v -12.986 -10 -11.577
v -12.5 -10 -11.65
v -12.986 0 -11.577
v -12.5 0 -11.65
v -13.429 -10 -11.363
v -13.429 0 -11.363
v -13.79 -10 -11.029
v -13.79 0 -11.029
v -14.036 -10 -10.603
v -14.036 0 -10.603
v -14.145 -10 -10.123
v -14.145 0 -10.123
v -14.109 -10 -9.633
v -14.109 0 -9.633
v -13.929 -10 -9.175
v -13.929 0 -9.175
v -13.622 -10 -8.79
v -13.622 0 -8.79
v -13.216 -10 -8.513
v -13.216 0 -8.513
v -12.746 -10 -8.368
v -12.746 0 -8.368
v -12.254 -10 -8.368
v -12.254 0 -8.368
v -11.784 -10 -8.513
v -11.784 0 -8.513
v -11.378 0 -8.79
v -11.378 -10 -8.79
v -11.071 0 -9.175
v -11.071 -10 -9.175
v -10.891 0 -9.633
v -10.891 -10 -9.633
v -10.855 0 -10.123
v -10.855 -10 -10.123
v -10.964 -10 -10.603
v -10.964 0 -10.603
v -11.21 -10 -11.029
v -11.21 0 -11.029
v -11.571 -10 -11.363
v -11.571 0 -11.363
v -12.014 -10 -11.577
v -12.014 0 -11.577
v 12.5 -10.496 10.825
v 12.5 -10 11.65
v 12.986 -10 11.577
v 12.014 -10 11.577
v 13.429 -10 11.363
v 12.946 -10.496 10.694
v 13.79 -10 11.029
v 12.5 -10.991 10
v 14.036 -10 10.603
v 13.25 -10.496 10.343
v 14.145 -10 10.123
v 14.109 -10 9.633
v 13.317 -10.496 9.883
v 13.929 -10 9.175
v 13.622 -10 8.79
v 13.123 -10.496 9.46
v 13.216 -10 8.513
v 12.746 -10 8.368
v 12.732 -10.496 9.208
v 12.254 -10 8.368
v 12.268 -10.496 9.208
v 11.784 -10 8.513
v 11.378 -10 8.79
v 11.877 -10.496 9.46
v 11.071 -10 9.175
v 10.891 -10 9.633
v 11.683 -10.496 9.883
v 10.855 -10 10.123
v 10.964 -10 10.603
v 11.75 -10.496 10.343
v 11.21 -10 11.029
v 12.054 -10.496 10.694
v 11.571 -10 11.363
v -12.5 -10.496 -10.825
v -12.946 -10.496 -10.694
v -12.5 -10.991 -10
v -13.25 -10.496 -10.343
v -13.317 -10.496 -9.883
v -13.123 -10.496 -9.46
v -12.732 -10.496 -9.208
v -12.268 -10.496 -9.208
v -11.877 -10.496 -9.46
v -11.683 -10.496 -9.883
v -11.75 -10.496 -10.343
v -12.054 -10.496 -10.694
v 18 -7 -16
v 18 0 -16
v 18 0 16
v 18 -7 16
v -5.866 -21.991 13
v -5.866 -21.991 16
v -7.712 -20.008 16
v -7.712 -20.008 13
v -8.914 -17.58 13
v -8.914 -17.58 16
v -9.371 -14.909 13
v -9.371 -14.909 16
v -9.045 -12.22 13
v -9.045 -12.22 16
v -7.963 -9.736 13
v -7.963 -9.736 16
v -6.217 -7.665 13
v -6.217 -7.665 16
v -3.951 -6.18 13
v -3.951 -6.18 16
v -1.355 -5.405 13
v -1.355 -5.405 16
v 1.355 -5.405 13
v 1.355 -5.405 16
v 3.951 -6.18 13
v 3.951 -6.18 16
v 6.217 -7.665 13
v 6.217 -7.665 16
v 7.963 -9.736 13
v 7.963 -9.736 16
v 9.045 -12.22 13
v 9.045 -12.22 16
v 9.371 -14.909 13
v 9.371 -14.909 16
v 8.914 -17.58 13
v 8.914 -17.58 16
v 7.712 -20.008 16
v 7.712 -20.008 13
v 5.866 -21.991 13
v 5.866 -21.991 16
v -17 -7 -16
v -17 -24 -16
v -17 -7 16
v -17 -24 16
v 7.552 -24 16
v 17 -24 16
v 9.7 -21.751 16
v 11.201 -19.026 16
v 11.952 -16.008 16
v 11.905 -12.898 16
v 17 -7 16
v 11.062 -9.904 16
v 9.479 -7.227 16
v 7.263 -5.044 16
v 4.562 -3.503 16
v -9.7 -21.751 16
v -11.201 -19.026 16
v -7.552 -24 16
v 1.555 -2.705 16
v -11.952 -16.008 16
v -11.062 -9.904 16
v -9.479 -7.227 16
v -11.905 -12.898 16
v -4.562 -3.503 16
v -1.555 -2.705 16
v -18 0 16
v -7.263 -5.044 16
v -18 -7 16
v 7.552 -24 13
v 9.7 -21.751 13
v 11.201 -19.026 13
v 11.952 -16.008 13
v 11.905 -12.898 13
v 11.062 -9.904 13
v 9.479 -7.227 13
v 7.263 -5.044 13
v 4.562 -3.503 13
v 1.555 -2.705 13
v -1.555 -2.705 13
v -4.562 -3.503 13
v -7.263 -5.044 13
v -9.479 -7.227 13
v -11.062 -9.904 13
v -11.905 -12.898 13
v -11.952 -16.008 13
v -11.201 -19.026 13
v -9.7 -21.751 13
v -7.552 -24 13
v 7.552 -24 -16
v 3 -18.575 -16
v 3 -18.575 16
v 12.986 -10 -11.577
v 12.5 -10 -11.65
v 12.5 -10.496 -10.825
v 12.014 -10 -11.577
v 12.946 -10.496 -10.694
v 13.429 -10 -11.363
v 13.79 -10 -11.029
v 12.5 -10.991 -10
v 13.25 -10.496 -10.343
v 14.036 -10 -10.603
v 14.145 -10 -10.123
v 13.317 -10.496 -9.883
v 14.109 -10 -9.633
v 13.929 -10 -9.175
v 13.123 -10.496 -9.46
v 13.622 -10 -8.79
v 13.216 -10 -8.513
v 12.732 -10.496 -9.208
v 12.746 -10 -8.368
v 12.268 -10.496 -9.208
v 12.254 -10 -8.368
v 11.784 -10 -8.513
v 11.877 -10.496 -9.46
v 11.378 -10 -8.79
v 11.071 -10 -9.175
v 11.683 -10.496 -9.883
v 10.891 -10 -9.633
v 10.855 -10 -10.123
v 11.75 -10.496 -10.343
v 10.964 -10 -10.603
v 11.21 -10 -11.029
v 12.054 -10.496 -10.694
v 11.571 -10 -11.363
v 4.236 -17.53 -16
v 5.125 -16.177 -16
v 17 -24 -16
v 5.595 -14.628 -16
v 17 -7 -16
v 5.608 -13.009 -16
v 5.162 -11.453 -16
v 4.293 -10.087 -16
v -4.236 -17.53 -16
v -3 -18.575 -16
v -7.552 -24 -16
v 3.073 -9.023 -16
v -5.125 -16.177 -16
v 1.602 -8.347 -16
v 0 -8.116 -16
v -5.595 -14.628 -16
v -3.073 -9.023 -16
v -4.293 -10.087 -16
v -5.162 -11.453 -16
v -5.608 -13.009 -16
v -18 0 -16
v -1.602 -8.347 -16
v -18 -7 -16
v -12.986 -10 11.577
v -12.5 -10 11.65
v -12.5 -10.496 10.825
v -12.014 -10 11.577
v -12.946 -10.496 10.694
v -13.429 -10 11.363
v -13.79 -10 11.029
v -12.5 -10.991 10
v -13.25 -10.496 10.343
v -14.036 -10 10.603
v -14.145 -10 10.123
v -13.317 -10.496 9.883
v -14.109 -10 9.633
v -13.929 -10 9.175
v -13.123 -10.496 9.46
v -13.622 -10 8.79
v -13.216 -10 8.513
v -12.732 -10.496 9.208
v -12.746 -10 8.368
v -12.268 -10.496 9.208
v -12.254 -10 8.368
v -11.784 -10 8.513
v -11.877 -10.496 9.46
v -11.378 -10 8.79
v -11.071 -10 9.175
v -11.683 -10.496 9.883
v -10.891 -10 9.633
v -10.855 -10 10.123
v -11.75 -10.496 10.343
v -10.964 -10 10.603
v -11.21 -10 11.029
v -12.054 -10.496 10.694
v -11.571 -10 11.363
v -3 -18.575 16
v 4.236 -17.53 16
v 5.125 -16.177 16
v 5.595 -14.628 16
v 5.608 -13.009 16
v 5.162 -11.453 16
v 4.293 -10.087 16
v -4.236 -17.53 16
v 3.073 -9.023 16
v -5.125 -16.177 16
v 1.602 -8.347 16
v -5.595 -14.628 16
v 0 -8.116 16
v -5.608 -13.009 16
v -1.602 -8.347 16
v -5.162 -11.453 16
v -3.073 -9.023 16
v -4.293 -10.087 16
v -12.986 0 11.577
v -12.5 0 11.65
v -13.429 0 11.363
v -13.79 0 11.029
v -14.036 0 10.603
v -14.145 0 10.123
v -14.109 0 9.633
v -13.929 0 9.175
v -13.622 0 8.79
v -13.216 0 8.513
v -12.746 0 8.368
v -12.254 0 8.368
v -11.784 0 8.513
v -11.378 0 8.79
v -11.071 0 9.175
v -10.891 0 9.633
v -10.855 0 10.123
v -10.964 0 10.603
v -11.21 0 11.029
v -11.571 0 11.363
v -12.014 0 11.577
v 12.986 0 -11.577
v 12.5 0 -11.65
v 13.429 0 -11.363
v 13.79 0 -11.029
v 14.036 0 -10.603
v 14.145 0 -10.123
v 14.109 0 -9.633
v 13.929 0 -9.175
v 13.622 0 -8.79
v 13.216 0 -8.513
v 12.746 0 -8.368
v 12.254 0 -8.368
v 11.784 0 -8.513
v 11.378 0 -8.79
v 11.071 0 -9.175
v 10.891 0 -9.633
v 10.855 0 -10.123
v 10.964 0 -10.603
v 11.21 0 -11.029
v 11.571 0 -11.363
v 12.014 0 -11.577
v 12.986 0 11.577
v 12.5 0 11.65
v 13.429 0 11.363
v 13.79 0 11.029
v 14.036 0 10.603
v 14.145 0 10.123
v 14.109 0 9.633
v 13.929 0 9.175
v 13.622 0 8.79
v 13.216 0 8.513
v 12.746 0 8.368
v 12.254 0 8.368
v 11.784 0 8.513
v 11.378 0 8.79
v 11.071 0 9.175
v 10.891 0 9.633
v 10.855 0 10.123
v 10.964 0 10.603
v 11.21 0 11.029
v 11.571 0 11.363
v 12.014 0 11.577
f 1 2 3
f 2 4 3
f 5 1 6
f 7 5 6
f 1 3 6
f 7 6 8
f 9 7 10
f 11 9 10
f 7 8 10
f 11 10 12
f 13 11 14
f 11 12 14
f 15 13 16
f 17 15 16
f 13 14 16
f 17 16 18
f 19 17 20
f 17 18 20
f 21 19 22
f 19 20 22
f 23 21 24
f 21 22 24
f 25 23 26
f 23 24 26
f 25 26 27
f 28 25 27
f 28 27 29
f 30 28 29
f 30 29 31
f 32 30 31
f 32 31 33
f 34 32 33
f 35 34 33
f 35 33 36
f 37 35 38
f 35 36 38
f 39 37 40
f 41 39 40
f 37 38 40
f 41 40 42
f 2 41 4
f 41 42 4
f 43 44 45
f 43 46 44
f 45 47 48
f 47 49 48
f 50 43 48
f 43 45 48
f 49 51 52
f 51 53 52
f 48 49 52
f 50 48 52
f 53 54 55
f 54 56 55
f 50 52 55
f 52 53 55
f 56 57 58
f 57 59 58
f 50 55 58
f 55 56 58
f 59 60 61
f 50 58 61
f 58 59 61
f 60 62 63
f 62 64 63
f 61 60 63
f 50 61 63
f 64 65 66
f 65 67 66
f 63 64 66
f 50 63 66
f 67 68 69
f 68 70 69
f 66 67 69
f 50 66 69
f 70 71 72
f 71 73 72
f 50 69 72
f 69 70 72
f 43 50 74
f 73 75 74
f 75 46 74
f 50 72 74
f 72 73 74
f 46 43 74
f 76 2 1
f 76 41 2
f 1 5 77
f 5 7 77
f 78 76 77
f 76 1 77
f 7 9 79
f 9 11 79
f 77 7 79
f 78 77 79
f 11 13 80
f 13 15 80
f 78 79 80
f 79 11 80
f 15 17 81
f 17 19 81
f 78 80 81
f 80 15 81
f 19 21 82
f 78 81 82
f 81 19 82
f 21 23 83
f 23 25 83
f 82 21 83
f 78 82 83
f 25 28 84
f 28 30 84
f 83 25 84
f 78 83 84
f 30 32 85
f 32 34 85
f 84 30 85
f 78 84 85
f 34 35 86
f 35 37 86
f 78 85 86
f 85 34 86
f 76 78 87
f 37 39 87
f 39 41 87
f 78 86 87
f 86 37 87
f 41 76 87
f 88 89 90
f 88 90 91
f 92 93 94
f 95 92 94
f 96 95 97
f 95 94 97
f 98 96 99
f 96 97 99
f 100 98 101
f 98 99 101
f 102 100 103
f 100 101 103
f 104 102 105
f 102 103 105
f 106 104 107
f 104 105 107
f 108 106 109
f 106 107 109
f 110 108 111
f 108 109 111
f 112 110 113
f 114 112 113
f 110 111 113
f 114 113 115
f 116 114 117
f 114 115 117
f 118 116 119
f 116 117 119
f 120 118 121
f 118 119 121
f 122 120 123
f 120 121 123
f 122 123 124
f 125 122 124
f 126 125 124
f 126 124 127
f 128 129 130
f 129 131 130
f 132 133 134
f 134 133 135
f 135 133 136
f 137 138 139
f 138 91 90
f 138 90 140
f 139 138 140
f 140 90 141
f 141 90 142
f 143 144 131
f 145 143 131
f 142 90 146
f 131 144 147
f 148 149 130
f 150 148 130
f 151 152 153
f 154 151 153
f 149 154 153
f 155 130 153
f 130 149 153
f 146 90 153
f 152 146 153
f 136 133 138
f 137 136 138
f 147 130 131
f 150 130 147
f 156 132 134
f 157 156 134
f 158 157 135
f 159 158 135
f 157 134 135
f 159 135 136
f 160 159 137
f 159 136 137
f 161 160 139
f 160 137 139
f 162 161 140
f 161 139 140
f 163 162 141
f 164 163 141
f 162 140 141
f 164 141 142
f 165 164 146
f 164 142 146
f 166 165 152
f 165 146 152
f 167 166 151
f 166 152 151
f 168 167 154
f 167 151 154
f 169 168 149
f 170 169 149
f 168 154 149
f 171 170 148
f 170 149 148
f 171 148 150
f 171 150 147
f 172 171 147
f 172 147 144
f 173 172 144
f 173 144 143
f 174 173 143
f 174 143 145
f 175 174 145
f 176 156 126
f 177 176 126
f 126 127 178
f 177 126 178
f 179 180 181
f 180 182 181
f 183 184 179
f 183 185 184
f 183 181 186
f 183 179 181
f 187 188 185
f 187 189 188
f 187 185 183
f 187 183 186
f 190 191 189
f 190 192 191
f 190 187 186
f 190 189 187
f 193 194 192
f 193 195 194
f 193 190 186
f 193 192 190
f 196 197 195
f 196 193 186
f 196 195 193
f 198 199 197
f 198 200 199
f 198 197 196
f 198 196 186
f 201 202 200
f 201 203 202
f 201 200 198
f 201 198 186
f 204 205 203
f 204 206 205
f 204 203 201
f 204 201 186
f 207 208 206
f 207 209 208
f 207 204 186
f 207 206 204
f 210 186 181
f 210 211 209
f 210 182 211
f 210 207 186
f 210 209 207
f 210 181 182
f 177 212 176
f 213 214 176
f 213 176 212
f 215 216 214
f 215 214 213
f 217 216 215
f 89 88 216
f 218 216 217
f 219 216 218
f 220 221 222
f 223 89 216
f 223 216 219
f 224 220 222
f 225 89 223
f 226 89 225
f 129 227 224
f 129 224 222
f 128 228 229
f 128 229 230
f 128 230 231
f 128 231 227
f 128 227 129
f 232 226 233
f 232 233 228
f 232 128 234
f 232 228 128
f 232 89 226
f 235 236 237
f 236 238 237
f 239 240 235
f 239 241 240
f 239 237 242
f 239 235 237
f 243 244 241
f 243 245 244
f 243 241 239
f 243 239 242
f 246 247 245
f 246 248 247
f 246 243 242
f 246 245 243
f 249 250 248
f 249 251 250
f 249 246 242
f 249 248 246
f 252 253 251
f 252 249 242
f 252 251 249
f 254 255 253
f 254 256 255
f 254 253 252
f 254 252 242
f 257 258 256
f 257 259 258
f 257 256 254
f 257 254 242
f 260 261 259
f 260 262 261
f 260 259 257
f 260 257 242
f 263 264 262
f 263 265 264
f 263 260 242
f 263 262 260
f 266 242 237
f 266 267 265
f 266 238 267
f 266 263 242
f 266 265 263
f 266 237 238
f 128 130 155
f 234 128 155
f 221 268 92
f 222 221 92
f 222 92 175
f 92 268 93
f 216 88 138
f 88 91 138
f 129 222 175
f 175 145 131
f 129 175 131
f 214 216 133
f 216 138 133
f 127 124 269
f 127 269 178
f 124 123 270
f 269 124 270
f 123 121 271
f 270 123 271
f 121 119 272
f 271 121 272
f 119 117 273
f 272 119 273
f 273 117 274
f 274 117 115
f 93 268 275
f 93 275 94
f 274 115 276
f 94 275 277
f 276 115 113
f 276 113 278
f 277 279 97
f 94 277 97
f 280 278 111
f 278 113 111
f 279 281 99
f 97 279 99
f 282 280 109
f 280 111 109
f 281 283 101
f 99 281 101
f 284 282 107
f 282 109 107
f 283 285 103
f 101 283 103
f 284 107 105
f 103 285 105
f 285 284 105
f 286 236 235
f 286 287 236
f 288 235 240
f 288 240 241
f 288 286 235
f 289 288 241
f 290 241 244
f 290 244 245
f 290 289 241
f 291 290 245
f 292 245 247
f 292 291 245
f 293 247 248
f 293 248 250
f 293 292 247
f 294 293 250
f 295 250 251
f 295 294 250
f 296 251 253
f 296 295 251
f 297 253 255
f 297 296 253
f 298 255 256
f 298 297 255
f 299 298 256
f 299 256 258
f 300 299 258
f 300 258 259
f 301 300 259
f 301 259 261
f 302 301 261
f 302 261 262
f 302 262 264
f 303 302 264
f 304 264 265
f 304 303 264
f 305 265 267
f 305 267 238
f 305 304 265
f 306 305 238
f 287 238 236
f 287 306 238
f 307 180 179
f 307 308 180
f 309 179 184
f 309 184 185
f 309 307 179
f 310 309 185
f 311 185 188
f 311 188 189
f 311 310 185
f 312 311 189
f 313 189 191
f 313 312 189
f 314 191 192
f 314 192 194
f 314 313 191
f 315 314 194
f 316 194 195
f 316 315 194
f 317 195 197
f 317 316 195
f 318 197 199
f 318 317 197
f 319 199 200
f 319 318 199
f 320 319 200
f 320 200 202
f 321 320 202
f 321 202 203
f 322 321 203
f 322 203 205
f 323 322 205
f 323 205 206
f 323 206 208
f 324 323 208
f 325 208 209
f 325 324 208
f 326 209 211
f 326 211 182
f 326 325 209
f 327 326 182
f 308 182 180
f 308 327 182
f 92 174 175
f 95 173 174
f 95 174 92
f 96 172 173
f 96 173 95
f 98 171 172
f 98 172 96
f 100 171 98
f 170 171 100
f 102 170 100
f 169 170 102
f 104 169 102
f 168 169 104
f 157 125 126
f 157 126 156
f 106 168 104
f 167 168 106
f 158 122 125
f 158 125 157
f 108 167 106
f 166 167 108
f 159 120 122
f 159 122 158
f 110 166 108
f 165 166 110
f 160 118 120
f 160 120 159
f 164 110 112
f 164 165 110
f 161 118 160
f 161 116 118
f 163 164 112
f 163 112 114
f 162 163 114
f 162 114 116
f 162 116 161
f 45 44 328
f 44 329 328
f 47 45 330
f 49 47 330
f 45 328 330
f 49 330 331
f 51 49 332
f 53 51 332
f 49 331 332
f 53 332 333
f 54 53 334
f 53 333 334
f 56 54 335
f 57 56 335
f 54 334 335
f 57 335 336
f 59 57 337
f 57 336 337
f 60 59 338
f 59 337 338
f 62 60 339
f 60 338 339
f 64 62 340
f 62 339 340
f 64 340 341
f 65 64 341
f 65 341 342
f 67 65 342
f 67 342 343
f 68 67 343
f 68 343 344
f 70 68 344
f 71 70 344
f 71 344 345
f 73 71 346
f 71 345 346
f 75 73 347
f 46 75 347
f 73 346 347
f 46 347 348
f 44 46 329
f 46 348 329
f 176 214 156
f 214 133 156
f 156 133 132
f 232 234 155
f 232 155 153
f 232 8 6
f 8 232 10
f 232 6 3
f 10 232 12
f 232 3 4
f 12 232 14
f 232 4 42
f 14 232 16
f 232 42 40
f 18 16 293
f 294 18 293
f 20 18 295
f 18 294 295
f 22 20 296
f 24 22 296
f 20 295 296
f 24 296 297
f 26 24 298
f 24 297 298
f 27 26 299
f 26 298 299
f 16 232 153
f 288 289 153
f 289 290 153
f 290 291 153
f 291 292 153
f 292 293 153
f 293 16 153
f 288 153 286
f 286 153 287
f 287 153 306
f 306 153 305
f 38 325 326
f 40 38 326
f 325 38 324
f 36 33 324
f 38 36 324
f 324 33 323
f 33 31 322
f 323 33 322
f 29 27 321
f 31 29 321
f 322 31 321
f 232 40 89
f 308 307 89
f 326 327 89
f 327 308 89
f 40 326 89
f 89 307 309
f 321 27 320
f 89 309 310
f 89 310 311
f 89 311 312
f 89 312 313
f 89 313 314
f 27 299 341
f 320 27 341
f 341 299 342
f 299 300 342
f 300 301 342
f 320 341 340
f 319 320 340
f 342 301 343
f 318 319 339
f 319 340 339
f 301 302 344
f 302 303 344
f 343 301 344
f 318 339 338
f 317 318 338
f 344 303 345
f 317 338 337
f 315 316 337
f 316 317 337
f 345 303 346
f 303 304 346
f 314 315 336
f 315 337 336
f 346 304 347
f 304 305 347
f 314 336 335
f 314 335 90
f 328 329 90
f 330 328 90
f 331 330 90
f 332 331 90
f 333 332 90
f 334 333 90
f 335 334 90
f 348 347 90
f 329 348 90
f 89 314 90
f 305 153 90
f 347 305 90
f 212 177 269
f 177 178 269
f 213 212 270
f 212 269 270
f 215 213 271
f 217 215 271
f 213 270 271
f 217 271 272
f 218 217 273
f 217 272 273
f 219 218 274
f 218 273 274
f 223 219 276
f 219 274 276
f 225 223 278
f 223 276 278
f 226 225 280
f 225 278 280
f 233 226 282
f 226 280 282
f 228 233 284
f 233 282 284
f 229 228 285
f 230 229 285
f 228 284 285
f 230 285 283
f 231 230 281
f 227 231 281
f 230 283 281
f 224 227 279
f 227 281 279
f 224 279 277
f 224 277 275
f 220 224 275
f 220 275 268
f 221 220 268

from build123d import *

# Parameters (mm, degrees)
EXTRUDE_1_DEPTH     = 16
CUT_EXTRUDE_1_DEPTH = 3


with BuildPart() as part:
    # 草图1 → 凸台-拉伸1 (new, symmetric)
    with BuildSketch(Plane.XY):
        with BuildLine():
            Line((-18, 0), (18, 0))
            Line((18, 0), (18, -7))
            Line((18, -7), (17, -7))
            Line((17, -7), (17, -24))
            Line((17, -24), (7.551896681, -24))
            Line((7.551896681, -24), (3, -18.575260778))
            ThreePointArc((3, -18.575260778), (0, -8.115719133), (-3, -18.575260778))
            Line((-3, -18.575260778), (-7.551896681, -24))
            Line((-7.551896681, -24), (-17, -24))
            Line((-17, -24), (-17, -7))
            Line((-17, -7), (-18, -7))
            Line((-18, -7), (-18, 0))
        make_face()
    extrude(amount=EXTRUDE_1_DEPTH, both=True)

    # 草图2 → 切除-拉伸1 (cut)
    with BuildSketch(Plane.XY.offset(16)):
        with BuildLine():
            Line((-7.551896681, -24), (-5.866143417, -21.990997492))
            ThreePointArc((-5.866143417, -21.990997492), (0, -5.306607169), (5.866143417, -21.990997492))
            Line((5.866143417, -21.990997492), (7.551896681, -24))
            ThreePointArc((7.551896681, -24), (0, -2.604245979), (-7.551896681, -24))
        make_face()
    extrude(amount=-CUT_EXTRUDE_1_DEPTH, mode=Mode.SUBTRACT)

    # 草图4 → M4 螺纹孔的螺纹孔钻头1 (revolve, cut)
    with BuildSketch(Plane(origin=(-12.5, 0, 10), x_dir=(0, 0, 1), z_dir=(1, 0, 0))):
        Polygon((0, 0), (0, 10.991420021), (1.65, 10), (1.65, 0), align=None)
    hole_wizard_m4_1 = revolve(axis=Axis((-12.5, 6.35, 10), (0, -1, 0)), mode=Mode.SUBTRACT)

    # 镜向1: M4 螺纹孔的螺纹孔钻头1 across plane
    add(hole_wizard_m4_1.mirror(Plane.XY), mode=Mode.SUBTRACT)

    # 镜向2: M4 螺纹孔的螺纹孔钻头1 across plane
    add(hole_wizard_m4_1.mirror(Plane(origin=(0, 0, 0), x_dir=(0, 0, 1), z_dir=(1, 0, 0))), mode=Mode.SUBTRACT)

    # 镜向2 copy 1 sketch → 镜向2 copy 1 (revolve, cut)
    with BuildSketch(Plane(origin=(12.5, 0, -10), x_dir=(0, 0, -1), z_dir=(-1, 0, 0))):
        Polygon((0, 0), (0, 10.991420021), (1.65, 10), (1.65, 0), align=None)
    revolve(axis=Axis((12.5, 6.35, -10), (0, -1, 0)), mode=Mode.SUBTRACT)


solid = part.part
